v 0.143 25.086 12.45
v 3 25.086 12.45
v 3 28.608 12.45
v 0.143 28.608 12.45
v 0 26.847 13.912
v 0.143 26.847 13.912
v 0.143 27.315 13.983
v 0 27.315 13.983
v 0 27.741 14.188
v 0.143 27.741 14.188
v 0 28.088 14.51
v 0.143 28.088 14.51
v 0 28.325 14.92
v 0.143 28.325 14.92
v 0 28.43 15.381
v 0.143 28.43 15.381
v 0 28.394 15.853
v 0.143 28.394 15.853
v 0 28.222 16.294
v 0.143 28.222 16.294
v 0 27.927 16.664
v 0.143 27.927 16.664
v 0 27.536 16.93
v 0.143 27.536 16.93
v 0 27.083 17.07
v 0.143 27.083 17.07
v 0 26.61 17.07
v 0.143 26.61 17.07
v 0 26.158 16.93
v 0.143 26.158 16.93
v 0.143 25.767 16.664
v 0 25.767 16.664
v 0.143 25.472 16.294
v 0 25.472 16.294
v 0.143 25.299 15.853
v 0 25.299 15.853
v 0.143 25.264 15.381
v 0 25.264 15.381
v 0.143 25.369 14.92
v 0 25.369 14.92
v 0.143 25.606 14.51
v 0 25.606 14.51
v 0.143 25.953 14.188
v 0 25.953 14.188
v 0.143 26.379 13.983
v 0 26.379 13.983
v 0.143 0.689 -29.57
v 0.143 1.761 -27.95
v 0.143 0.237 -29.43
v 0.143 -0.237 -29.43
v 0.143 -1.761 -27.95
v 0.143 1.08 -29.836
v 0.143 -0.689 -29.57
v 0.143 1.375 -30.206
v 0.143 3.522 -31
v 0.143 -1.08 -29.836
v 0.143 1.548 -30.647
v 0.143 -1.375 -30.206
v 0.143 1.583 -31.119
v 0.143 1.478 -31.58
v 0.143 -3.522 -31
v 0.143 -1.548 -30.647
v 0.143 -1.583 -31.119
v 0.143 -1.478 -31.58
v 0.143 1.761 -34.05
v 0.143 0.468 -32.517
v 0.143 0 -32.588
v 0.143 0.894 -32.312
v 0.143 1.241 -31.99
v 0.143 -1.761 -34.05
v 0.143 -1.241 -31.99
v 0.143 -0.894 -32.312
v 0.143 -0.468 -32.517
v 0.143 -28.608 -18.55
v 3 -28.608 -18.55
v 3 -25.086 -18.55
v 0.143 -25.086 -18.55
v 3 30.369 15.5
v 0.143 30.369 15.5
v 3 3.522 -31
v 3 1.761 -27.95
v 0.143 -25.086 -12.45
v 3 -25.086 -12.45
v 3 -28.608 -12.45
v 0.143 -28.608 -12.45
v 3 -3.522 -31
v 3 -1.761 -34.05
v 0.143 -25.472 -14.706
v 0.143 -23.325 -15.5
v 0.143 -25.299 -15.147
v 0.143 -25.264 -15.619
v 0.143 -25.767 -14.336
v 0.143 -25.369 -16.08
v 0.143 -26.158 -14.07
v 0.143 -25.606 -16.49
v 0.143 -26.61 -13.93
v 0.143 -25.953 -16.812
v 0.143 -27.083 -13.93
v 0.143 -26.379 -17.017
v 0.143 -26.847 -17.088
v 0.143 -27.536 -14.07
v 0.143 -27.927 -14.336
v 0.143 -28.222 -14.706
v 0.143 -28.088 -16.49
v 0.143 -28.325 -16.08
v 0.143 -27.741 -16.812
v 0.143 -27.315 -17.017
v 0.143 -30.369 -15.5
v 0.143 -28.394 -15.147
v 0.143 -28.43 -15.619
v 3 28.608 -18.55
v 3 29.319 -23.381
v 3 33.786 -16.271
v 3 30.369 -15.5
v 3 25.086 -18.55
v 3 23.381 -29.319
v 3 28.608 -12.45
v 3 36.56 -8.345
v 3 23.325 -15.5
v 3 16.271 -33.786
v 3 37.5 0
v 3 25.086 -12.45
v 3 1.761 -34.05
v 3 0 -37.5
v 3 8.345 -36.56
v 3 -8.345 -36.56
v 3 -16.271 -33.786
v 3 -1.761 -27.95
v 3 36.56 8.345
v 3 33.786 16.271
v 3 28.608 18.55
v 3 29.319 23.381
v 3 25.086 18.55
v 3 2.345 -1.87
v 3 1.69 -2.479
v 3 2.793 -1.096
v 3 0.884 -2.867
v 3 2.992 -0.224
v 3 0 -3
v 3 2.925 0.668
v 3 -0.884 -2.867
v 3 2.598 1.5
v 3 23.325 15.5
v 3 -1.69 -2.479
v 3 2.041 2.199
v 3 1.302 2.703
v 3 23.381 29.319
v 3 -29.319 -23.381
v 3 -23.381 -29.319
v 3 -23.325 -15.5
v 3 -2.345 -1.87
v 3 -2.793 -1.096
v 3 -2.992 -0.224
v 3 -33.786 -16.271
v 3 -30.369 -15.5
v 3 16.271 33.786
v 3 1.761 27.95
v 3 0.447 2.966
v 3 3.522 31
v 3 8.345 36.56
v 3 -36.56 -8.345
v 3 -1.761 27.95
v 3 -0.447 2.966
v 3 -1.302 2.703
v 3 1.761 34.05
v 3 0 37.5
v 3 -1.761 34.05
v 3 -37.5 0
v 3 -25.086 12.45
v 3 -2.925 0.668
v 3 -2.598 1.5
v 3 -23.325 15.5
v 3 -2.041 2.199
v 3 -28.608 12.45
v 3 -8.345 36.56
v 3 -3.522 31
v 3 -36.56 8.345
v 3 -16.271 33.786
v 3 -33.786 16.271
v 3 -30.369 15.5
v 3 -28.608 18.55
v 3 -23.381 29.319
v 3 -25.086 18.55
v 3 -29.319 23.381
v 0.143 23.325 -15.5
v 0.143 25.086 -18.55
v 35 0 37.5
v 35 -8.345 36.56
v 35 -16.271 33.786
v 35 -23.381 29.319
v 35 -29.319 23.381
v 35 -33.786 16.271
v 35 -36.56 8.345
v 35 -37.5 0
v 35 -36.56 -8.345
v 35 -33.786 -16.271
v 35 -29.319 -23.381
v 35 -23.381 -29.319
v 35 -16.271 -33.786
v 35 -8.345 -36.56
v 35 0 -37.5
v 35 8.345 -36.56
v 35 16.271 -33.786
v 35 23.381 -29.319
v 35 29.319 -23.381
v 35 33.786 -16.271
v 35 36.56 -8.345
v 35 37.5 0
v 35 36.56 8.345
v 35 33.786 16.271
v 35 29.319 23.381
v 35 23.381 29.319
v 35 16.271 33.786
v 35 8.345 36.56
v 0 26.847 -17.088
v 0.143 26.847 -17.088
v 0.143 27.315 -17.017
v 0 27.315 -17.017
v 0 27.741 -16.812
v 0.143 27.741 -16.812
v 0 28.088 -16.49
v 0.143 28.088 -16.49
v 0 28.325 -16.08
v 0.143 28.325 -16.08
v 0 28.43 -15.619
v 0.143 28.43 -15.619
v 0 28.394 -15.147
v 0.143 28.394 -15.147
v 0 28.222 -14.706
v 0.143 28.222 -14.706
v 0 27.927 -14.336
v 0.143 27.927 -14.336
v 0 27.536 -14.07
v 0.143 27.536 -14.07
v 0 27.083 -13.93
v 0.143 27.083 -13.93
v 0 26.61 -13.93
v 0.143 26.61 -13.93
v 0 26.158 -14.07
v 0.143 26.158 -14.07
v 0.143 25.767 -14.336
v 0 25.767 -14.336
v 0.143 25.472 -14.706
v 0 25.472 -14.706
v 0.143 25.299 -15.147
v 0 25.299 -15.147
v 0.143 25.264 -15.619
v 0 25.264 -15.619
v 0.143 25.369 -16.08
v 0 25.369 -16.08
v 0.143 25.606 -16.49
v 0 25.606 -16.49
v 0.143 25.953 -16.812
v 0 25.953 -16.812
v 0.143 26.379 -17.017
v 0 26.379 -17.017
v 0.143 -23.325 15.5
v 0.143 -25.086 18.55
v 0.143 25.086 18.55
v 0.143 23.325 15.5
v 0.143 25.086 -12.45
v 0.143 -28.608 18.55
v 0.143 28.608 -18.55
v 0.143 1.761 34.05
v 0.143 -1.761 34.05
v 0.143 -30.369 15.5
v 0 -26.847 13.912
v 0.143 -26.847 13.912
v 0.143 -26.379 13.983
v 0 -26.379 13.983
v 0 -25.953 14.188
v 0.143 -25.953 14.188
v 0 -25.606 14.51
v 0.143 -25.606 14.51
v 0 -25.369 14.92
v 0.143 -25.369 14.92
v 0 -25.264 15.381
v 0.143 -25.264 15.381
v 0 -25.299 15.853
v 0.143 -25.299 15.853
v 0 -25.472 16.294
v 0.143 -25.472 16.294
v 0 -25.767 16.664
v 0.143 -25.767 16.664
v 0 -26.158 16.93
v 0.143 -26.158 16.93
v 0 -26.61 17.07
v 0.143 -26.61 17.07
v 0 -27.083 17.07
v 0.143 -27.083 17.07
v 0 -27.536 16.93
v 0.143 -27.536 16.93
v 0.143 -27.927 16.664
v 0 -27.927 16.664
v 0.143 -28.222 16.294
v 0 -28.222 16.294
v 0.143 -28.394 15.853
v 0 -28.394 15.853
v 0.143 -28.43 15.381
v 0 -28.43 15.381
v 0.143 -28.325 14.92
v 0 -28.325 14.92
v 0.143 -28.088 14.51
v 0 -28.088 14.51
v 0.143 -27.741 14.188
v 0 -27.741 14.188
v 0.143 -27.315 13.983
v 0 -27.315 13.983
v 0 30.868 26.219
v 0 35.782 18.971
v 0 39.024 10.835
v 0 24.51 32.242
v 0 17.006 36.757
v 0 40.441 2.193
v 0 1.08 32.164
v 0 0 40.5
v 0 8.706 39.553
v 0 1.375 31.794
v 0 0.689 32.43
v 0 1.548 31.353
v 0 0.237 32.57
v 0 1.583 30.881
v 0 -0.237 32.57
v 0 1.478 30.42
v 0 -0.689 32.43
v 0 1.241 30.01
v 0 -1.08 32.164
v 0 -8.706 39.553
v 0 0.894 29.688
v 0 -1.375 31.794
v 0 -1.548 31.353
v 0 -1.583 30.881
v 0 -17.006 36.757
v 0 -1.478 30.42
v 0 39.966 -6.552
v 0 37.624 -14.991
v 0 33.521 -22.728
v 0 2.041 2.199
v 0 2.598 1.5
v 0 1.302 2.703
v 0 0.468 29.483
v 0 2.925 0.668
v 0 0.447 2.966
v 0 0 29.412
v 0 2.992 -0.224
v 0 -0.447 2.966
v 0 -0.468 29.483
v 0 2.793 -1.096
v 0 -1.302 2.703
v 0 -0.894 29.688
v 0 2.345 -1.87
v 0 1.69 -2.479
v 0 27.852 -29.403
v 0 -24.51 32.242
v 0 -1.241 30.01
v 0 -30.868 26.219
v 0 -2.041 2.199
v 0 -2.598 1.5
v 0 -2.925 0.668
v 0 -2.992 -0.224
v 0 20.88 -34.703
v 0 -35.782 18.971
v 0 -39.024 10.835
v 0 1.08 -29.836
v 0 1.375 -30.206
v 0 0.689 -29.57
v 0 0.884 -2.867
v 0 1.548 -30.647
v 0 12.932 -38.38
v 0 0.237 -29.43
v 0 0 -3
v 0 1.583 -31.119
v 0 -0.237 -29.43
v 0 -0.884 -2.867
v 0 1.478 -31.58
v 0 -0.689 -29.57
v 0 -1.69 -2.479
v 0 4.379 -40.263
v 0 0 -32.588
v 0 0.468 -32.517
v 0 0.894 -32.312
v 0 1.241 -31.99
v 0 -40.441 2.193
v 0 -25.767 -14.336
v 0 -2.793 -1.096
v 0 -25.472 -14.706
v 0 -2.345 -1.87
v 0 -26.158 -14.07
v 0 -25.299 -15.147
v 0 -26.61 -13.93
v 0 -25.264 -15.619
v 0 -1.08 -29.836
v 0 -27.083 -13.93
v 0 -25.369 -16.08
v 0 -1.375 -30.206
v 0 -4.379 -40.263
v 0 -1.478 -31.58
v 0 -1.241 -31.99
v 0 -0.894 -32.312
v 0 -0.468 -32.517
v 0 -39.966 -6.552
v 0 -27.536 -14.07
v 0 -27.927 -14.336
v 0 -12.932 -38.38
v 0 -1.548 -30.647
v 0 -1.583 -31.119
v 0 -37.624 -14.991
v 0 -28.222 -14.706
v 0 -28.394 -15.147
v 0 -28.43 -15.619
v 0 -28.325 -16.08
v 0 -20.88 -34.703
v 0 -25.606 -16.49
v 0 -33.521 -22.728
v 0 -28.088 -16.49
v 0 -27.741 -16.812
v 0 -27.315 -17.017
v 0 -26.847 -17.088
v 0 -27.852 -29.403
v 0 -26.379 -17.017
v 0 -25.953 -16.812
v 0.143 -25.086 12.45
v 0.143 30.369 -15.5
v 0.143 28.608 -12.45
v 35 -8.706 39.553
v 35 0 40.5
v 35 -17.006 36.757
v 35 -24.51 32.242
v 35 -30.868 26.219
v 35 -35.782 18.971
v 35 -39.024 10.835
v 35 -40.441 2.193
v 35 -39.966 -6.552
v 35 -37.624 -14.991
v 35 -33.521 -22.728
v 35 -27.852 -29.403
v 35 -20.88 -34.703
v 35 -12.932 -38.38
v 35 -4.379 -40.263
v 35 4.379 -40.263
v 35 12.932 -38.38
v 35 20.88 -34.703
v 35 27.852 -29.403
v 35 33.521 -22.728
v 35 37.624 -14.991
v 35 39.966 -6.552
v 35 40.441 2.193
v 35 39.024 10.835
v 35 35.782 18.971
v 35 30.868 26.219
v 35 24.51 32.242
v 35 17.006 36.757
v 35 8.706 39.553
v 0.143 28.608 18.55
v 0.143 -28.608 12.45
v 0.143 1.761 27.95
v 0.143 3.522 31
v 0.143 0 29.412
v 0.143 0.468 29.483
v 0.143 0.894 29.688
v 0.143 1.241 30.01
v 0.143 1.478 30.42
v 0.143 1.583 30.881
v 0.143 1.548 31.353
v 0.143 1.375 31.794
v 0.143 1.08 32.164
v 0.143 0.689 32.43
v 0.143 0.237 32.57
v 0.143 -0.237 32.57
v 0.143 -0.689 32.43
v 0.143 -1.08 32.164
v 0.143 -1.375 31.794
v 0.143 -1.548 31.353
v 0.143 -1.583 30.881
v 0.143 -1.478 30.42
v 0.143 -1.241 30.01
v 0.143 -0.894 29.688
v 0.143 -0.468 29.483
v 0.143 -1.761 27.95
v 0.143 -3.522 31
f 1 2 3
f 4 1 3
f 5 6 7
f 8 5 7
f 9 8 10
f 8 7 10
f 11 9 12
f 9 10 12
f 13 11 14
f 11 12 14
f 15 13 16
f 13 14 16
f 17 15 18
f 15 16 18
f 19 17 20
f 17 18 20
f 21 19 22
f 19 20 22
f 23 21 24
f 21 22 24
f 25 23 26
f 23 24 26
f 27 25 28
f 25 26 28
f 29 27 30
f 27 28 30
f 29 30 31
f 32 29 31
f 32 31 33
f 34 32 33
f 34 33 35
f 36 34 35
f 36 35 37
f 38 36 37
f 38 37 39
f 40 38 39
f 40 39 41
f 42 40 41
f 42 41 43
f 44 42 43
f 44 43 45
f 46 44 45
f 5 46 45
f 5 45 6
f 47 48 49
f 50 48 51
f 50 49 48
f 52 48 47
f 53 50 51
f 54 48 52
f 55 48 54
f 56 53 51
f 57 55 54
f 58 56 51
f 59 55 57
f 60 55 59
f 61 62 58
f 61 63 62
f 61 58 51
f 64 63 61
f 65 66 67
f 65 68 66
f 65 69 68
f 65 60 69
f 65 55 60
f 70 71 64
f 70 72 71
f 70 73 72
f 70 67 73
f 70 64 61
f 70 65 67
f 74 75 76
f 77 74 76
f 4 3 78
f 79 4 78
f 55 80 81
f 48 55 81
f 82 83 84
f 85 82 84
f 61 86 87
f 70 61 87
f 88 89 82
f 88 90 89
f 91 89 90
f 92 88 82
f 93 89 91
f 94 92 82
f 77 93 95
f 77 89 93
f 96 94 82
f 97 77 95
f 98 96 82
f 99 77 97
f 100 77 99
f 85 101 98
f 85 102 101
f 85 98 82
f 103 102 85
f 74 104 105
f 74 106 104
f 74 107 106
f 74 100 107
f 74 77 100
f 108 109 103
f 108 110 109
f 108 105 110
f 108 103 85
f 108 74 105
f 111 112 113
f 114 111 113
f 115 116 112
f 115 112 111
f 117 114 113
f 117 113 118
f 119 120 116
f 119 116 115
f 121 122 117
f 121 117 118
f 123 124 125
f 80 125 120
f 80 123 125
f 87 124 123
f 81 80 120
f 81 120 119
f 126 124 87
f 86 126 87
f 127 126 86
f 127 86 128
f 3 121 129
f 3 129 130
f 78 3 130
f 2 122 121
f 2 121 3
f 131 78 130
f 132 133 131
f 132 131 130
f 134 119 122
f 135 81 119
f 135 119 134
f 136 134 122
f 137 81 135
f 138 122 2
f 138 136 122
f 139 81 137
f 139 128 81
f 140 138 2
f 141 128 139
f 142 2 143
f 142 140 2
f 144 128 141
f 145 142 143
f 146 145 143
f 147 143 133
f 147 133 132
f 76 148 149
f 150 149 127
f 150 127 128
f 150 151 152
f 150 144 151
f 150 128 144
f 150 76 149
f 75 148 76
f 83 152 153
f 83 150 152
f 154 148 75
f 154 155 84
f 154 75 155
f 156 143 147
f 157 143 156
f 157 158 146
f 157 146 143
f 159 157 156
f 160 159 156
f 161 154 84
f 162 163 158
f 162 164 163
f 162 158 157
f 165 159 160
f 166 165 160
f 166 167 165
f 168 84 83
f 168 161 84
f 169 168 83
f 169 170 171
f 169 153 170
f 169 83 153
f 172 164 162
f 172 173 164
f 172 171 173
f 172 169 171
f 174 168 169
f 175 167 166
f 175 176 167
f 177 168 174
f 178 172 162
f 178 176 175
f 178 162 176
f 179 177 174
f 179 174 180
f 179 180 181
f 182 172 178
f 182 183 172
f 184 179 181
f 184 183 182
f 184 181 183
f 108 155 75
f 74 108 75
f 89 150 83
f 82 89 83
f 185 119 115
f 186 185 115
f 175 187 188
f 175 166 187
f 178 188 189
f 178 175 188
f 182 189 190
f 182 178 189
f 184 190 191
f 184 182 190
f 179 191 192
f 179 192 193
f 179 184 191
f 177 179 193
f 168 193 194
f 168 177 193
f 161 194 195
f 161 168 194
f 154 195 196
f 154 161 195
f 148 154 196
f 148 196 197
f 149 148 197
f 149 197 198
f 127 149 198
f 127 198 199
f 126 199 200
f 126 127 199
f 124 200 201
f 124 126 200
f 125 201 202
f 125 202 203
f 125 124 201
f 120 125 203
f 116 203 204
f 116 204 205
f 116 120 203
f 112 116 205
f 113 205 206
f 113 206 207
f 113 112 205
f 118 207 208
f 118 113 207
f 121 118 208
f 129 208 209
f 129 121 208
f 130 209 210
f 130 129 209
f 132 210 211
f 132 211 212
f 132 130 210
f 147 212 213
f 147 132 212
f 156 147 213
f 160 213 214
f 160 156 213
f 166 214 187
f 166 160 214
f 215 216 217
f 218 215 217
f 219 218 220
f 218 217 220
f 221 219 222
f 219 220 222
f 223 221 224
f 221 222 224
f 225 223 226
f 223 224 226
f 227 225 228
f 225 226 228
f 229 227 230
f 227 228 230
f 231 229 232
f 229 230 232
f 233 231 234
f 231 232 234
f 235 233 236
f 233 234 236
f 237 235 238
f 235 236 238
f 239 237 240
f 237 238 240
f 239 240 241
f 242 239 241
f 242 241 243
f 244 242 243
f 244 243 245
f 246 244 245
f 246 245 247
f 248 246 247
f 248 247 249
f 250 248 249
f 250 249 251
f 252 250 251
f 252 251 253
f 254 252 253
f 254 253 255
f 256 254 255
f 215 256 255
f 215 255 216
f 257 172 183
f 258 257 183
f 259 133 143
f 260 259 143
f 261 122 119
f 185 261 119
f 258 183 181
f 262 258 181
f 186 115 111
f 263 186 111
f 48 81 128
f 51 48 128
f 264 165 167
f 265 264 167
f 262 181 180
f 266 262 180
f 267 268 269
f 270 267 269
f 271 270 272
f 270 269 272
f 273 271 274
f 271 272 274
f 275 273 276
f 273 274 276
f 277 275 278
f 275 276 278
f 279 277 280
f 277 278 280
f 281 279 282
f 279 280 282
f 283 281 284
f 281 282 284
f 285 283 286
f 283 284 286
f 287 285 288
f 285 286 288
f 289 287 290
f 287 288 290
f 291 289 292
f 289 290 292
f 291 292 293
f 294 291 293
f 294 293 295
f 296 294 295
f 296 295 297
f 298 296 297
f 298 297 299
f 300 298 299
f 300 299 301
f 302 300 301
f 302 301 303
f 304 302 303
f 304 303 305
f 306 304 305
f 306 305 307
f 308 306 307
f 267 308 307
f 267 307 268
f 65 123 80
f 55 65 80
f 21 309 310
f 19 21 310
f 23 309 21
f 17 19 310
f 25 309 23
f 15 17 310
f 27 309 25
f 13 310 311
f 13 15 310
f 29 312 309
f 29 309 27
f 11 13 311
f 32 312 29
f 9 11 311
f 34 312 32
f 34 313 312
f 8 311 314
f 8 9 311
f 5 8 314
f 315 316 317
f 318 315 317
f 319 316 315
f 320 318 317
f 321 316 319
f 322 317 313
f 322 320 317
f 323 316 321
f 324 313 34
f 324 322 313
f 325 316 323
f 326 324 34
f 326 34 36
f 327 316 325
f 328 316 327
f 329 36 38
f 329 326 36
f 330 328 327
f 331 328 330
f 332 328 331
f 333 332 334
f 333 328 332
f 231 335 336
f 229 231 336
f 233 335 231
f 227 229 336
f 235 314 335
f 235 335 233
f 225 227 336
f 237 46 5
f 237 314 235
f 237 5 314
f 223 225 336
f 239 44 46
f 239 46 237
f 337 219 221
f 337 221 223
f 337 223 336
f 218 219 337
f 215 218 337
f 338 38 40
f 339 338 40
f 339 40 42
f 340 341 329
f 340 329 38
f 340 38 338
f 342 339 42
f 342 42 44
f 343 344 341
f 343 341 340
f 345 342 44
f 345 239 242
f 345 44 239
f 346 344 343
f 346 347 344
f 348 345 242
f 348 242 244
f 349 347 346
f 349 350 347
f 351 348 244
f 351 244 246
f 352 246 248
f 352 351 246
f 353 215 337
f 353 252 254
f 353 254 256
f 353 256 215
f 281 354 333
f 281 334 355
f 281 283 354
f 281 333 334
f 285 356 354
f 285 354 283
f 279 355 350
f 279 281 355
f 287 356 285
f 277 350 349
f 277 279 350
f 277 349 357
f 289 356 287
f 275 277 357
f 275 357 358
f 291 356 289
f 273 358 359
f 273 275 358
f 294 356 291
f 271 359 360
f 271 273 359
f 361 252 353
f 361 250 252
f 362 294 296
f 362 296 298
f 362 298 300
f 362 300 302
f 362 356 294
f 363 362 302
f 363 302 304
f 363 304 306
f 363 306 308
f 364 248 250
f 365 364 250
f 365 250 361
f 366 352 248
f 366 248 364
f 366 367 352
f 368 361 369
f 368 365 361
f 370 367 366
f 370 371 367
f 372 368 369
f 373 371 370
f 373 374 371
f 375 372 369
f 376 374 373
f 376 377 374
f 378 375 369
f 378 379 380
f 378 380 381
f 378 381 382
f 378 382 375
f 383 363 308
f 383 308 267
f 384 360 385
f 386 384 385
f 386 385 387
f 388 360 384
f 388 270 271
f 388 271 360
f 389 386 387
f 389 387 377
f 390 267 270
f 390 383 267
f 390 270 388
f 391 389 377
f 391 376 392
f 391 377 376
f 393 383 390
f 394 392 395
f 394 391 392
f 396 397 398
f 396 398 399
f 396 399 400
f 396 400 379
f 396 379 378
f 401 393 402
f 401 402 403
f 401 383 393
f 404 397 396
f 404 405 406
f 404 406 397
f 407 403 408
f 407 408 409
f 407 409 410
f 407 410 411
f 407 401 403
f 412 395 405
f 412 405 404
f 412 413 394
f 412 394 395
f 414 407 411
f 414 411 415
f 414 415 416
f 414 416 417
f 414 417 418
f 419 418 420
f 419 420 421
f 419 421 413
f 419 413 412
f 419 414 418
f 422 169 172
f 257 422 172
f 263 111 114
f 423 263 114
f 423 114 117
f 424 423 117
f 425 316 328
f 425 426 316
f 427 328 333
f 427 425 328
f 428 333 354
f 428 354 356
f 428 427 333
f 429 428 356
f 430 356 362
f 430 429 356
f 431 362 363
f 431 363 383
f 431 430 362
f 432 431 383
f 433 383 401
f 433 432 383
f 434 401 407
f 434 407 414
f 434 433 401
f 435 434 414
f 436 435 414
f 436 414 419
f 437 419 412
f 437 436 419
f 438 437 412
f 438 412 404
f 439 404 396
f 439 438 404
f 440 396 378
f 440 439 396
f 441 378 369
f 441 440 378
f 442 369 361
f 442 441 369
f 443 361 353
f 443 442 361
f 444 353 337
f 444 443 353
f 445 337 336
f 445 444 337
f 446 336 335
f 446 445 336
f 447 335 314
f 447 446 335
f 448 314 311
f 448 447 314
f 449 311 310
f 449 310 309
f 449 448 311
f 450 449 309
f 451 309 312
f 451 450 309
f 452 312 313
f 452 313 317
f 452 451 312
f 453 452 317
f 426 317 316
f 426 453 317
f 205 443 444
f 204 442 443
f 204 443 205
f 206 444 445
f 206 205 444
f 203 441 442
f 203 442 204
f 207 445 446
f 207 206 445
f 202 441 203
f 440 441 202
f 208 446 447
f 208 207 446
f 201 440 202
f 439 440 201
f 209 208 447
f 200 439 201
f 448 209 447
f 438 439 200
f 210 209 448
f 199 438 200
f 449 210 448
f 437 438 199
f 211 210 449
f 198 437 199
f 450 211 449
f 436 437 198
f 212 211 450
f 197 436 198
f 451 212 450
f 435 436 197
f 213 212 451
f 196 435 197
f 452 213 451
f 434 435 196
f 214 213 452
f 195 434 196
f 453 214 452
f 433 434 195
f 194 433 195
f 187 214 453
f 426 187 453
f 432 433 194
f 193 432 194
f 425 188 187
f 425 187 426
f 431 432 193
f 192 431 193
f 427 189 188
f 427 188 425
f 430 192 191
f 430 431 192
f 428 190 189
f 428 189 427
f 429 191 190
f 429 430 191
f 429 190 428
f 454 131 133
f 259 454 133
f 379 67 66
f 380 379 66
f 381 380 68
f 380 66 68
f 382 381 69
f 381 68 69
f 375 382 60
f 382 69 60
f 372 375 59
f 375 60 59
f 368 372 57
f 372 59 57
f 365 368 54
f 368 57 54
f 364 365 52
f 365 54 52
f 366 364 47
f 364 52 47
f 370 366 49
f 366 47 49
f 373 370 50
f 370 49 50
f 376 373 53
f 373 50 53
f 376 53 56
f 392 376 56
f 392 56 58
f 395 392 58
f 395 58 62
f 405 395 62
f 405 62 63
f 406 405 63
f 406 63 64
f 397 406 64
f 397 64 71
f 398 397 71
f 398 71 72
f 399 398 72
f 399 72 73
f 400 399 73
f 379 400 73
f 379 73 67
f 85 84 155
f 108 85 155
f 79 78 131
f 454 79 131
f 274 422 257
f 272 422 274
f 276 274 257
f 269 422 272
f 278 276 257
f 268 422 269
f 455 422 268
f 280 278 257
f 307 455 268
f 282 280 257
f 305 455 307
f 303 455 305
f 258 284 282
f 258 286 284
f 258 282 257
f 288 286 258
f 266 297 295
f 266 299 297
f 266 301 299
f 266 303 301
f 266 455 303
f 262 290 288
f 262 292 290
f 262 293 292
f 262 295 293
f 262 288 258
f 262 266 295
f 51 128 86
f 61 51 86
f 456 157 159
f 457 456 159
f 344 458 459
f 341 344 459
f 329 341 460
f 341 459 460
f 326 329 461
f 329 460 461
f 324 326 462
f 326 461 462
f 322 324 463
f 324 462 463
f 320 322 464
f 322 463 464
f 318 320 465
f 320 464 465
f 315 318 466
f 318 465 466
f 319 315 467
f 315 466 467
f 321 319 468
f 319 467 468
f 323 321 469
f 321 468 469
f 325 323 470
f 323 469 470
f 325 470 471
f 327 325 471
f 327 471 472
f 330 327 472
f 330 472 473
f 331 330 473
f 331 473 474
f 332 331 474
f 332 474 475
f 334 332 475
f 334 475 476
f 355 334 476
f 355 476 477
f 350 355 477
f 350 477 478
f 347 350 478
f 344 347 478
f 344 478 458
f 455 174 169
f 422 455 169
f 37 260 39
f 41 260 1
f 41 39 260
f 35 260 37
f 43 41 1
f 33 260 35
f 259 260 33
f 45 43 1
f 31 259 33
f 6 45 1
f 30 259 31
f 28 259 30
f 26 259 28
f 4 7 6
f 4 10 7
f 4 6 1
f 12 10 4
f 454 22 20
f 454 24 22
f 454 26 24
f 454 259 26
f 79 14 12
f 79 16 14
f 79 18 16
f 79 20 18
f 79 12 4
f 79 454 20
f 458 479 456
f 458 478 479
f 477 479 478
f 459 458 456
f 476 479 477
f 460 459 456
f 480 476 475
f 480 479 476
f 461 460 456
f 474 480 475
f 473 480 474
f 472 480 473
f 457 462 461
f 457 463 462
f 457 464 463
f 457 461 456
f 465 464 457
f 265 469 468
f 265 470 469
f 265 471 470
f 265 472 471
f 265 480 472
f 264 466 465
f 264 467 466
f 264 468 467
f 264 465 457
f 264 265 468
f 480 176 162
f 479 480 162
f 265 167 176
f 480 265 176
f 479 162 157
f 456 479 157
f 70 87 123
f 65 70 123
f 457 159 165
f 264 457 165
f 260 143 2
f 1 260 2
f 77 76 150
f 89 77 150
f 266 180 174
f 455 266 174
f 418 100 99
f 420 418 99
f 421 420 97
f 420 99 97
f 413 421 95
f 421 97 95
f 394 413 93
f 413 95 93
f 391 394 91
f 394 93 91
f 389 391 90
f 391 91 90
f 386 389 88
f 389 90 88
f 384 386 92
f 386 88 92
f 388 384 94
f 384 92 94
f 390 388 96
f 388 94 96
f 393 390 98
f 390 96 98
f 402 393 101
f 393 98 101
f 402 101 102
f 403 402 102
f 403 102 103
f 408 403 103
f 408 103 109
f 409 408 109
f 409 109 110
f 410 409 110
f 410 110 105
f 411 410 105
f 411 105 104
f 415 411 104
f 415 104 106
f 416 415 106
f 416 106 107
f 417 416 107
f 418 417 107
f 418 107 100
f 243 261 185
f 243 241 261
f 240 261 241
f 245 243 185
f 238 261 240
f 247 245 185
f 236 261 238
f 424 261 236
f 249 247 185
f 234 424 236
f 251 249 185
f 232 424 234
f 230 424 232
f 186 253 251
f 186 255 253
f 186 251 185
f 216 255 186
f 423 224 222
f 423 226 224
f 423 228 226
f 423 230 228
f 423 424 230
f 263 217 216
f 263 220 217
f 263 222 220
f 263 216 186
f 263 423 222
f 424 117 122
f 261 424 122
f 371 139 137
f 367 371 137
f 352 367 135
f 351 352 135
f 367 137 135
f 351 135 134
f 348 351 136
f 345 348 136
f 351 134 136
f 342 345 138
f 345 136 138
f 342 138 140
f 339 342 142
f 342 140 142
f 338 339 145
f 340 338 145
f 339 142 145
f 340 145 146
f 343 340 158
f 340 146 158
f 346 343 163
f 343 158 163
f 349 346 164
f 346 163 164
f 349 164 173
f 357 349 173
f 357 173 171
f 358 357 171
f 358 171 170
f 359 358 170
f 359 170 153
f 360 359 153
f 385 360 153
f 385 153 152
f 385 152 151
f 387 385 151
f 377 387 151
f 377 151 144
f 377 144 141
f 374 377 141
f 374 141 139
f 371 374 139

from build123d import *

# Parameters (mm, degrees)
CUT_EXTRUDE1_REACH = 67.609
SKETCH2_R          = 1.5875
CUT_EXTRUDE2_DEPTH = 2.8575
CIRPATTERN1_COUNT  = 6
CUT_EXTRUDE3_REACH = 67.609
SKETCH4_R          = 3


with BuildPart() as part:
    # Sketch1 → Revolve1 (revolve)
    with BuildSketch(Plane.XY, mode=Mode.PRIVATE) as revolve1_sk:
        Polygon((0, 0), (0, 40.5), (35, 40.5), (35, 37.5), (3, 37.5), (3, 0), align=None)
    revolve(revolve1_sk.sketch.rotate(Axis((0, 0, 0), (1, 0, 0)), 90), axis=Axis((0, 0, 0), (1, 0, 0)))

    # Sketch2 → Cut-Extrude1 (cut, up to next)
    with BuildSketch(Plane(origin=(3, 0, 0), x_dir=(0, 0, -1), z_dir=(1, 0, 0)), mode=Mode.PRIVATE) as cut_extrude1_sk1:
        with Locations((-31, 0)):
            Circle(SKETCH2_R)
    cut_extrude1_tool1 = extrude(cut_extrude1_sk1.sketch, amount=-CUT_EXTRUDE1_REACH, mode=Mode.PRIVATE) & part.part
    # Sketch2 → Cut-Extrude1 (cut, up to next)
    with BuildSketch(Plane(origin=(3, 0, 0), x_dir=(0, 0, -1), z_dir=(1, 0, 0)), mode=Mode.PRIVATE) as cut_extrude1_sk2:
        with Locations((-15.5, 26.846787517)):
            Circle(SKETCH2_R)
    cut_extrude1_tool2 = extrude(cut_extrude1_sk2.sketch, amount=-CUT_EXTRUDE1_REACH, mode=Mode.PRIVATE) & part.part
    # Sketch2 → Cut-Extrude1 (cut, up to next)
    with BuildSketch(Plane(origin=(3, 0, 0), x_dir=(0, 0, -1), z_dir=(1, 0, 0)), mode=Mode.PRIVATE) as cut_extrude1_sk3:
        with Locations((15.5, 26.846787517)):
            Circle(SKETCH2_R)
    cut_extrude1_tool3 = extrude(cut_extrude1_sk3.sketch, amount=-CUT_EXTRUDE1_REACH, mode=Mode.PRIVATE) & part.part
    # Sketch2 → Cut-Extrude1 (cut, up to next)
    with BuildSketch(Plane(origin=(3, 0, 0), x_dir=(0, 0, -1), z_dir=(1, 0, 0)), mode=Mode.PRIVATE) as cut_extrude1_sk4:
        with Locations((31, 0)):
            Circle(SKETCH2_R)
    cut_extrude1_tool4 = extrude(cut_extrude1_sk4.sketch, amount=-CUT_EXTRUDE1_REACH, mode=Mode.PRIVATE) & part.part
    # Sketch2 → Cut-Extrude1 (cut, up to next)
    with BuildSketch(Plane(origin=(3, 0, 0), x_dir=(0, 0, -1), z_dir=(1, 0, 0)), mode=Mode.PRIVATE) as cut_extrude1_sk5:
        with Locations((15.5, -26.846787517)):
            Circle(SKETCH2_R)
    cut_extrude1_tool5 = extrude(cut_extrude1_sk5.sketch, amount=-CUT_EXTRUDE1_REACH, mode=Mode.PRIVATE) & part.part
    # Sketch2 → Cut-Extrude1 (cut, up to next)
    with BuildSketch(Plane(origin=(3, 0, 0), x_dir=(0, 0, -1), z_dir=(1, 0, 0)), mode=Mode.PRIVATE) as cut_extrude1_sk6:
        with Locations((-15.5, -26.846787517)):
            Circle(SKETCH2_R)
    cut_extrude1_tool6 = extrude(cut_extrude1_sk6.sketch, amount=-CUT_EXTRUDE1_REACH, mode=Mode.PRIVATE) & part.part
    add(cut_extrude1_tool1.solids().sort_by_distance((3, 0, 31))[0], mode=Mode.SUBTRACT)
    add(cut_extrude1_tool2.solids().sort_by_distance((3, 26.846788, 15.5))[0], mode=Mode.SUBTRACT)
    add(cut_extrude1_tool3.solids().sort_by_distance((3, 26.846788, -15.5))[0], mode=Mode.SUBTRACT)
    add(cut_extrude1_tool4.solids().sort_by_distance((3, 0, -31))[0], mode=Mode.SUBTRACT)
    add(cut_extrude1_tool5.solids().sort_by_distance((3, -26.846788, -15.5))[0], mode=Mode.SUBTRACT)
    add(cut_extrude1_tool6.solids().sort_by_distance((3, -26.846788, 15.5))[0], mode=Mode.SUBTRACT)

    # Sketch3 → Cut-Extrude2 (cut)
    with BuildSketch(Plane(origin=(3, 0, 0), x_dir=(0, 0, -1), z_dir=(1, 0, 0))):
        Polygon((18.55, 25.085869196), (18.55, 28.607705838), (15.5, 30.368624159), (12.45, 28.607705838), (12.45, 25.085869196), (15.5, 23.324950875), align=None)
    cut_extrude2 = extrude(amount=-CUT_EXTRUDE2_DEPTH, mode=Mode.SUBTRACT)

    # CirPattern1: Cut-Extrude2 ×6 about axis
    cirpattern1_axis = Axis((0, 0, 0), (1, 0, 0))
    for i in range(1, CIRPATTERN1_COUNT):
        add(cut_extrude2.rotate(cirpattern1_axis, i * 360 / CIRPATTERN1_COUNT), mode=Mode.SUBTRACT)

    # Sketch4 → Cut-Extrude3 (cut, up to next)
    with BuildSketch(Plane(origin=(3, 0, 0), x_dir=(0, 0, -1), z_dir=(1, 0, 0)), mode=Mode.PRIVATE) as cut_extrude3_sk1:
        Circle(SKETCH4_R)
    cut_extrude3_tool1 = extrude(cut_extrude3_sk1.sketch, amount=-CUT_EXTRUDE3_REACH, mode=Mode.PRIVATE) & part.part
    add(cut_extrude3_tool1.solids().sort_by_distance((3, 0, 0))[0], mode=Mode.SUBTRACT)


solid = part.part
